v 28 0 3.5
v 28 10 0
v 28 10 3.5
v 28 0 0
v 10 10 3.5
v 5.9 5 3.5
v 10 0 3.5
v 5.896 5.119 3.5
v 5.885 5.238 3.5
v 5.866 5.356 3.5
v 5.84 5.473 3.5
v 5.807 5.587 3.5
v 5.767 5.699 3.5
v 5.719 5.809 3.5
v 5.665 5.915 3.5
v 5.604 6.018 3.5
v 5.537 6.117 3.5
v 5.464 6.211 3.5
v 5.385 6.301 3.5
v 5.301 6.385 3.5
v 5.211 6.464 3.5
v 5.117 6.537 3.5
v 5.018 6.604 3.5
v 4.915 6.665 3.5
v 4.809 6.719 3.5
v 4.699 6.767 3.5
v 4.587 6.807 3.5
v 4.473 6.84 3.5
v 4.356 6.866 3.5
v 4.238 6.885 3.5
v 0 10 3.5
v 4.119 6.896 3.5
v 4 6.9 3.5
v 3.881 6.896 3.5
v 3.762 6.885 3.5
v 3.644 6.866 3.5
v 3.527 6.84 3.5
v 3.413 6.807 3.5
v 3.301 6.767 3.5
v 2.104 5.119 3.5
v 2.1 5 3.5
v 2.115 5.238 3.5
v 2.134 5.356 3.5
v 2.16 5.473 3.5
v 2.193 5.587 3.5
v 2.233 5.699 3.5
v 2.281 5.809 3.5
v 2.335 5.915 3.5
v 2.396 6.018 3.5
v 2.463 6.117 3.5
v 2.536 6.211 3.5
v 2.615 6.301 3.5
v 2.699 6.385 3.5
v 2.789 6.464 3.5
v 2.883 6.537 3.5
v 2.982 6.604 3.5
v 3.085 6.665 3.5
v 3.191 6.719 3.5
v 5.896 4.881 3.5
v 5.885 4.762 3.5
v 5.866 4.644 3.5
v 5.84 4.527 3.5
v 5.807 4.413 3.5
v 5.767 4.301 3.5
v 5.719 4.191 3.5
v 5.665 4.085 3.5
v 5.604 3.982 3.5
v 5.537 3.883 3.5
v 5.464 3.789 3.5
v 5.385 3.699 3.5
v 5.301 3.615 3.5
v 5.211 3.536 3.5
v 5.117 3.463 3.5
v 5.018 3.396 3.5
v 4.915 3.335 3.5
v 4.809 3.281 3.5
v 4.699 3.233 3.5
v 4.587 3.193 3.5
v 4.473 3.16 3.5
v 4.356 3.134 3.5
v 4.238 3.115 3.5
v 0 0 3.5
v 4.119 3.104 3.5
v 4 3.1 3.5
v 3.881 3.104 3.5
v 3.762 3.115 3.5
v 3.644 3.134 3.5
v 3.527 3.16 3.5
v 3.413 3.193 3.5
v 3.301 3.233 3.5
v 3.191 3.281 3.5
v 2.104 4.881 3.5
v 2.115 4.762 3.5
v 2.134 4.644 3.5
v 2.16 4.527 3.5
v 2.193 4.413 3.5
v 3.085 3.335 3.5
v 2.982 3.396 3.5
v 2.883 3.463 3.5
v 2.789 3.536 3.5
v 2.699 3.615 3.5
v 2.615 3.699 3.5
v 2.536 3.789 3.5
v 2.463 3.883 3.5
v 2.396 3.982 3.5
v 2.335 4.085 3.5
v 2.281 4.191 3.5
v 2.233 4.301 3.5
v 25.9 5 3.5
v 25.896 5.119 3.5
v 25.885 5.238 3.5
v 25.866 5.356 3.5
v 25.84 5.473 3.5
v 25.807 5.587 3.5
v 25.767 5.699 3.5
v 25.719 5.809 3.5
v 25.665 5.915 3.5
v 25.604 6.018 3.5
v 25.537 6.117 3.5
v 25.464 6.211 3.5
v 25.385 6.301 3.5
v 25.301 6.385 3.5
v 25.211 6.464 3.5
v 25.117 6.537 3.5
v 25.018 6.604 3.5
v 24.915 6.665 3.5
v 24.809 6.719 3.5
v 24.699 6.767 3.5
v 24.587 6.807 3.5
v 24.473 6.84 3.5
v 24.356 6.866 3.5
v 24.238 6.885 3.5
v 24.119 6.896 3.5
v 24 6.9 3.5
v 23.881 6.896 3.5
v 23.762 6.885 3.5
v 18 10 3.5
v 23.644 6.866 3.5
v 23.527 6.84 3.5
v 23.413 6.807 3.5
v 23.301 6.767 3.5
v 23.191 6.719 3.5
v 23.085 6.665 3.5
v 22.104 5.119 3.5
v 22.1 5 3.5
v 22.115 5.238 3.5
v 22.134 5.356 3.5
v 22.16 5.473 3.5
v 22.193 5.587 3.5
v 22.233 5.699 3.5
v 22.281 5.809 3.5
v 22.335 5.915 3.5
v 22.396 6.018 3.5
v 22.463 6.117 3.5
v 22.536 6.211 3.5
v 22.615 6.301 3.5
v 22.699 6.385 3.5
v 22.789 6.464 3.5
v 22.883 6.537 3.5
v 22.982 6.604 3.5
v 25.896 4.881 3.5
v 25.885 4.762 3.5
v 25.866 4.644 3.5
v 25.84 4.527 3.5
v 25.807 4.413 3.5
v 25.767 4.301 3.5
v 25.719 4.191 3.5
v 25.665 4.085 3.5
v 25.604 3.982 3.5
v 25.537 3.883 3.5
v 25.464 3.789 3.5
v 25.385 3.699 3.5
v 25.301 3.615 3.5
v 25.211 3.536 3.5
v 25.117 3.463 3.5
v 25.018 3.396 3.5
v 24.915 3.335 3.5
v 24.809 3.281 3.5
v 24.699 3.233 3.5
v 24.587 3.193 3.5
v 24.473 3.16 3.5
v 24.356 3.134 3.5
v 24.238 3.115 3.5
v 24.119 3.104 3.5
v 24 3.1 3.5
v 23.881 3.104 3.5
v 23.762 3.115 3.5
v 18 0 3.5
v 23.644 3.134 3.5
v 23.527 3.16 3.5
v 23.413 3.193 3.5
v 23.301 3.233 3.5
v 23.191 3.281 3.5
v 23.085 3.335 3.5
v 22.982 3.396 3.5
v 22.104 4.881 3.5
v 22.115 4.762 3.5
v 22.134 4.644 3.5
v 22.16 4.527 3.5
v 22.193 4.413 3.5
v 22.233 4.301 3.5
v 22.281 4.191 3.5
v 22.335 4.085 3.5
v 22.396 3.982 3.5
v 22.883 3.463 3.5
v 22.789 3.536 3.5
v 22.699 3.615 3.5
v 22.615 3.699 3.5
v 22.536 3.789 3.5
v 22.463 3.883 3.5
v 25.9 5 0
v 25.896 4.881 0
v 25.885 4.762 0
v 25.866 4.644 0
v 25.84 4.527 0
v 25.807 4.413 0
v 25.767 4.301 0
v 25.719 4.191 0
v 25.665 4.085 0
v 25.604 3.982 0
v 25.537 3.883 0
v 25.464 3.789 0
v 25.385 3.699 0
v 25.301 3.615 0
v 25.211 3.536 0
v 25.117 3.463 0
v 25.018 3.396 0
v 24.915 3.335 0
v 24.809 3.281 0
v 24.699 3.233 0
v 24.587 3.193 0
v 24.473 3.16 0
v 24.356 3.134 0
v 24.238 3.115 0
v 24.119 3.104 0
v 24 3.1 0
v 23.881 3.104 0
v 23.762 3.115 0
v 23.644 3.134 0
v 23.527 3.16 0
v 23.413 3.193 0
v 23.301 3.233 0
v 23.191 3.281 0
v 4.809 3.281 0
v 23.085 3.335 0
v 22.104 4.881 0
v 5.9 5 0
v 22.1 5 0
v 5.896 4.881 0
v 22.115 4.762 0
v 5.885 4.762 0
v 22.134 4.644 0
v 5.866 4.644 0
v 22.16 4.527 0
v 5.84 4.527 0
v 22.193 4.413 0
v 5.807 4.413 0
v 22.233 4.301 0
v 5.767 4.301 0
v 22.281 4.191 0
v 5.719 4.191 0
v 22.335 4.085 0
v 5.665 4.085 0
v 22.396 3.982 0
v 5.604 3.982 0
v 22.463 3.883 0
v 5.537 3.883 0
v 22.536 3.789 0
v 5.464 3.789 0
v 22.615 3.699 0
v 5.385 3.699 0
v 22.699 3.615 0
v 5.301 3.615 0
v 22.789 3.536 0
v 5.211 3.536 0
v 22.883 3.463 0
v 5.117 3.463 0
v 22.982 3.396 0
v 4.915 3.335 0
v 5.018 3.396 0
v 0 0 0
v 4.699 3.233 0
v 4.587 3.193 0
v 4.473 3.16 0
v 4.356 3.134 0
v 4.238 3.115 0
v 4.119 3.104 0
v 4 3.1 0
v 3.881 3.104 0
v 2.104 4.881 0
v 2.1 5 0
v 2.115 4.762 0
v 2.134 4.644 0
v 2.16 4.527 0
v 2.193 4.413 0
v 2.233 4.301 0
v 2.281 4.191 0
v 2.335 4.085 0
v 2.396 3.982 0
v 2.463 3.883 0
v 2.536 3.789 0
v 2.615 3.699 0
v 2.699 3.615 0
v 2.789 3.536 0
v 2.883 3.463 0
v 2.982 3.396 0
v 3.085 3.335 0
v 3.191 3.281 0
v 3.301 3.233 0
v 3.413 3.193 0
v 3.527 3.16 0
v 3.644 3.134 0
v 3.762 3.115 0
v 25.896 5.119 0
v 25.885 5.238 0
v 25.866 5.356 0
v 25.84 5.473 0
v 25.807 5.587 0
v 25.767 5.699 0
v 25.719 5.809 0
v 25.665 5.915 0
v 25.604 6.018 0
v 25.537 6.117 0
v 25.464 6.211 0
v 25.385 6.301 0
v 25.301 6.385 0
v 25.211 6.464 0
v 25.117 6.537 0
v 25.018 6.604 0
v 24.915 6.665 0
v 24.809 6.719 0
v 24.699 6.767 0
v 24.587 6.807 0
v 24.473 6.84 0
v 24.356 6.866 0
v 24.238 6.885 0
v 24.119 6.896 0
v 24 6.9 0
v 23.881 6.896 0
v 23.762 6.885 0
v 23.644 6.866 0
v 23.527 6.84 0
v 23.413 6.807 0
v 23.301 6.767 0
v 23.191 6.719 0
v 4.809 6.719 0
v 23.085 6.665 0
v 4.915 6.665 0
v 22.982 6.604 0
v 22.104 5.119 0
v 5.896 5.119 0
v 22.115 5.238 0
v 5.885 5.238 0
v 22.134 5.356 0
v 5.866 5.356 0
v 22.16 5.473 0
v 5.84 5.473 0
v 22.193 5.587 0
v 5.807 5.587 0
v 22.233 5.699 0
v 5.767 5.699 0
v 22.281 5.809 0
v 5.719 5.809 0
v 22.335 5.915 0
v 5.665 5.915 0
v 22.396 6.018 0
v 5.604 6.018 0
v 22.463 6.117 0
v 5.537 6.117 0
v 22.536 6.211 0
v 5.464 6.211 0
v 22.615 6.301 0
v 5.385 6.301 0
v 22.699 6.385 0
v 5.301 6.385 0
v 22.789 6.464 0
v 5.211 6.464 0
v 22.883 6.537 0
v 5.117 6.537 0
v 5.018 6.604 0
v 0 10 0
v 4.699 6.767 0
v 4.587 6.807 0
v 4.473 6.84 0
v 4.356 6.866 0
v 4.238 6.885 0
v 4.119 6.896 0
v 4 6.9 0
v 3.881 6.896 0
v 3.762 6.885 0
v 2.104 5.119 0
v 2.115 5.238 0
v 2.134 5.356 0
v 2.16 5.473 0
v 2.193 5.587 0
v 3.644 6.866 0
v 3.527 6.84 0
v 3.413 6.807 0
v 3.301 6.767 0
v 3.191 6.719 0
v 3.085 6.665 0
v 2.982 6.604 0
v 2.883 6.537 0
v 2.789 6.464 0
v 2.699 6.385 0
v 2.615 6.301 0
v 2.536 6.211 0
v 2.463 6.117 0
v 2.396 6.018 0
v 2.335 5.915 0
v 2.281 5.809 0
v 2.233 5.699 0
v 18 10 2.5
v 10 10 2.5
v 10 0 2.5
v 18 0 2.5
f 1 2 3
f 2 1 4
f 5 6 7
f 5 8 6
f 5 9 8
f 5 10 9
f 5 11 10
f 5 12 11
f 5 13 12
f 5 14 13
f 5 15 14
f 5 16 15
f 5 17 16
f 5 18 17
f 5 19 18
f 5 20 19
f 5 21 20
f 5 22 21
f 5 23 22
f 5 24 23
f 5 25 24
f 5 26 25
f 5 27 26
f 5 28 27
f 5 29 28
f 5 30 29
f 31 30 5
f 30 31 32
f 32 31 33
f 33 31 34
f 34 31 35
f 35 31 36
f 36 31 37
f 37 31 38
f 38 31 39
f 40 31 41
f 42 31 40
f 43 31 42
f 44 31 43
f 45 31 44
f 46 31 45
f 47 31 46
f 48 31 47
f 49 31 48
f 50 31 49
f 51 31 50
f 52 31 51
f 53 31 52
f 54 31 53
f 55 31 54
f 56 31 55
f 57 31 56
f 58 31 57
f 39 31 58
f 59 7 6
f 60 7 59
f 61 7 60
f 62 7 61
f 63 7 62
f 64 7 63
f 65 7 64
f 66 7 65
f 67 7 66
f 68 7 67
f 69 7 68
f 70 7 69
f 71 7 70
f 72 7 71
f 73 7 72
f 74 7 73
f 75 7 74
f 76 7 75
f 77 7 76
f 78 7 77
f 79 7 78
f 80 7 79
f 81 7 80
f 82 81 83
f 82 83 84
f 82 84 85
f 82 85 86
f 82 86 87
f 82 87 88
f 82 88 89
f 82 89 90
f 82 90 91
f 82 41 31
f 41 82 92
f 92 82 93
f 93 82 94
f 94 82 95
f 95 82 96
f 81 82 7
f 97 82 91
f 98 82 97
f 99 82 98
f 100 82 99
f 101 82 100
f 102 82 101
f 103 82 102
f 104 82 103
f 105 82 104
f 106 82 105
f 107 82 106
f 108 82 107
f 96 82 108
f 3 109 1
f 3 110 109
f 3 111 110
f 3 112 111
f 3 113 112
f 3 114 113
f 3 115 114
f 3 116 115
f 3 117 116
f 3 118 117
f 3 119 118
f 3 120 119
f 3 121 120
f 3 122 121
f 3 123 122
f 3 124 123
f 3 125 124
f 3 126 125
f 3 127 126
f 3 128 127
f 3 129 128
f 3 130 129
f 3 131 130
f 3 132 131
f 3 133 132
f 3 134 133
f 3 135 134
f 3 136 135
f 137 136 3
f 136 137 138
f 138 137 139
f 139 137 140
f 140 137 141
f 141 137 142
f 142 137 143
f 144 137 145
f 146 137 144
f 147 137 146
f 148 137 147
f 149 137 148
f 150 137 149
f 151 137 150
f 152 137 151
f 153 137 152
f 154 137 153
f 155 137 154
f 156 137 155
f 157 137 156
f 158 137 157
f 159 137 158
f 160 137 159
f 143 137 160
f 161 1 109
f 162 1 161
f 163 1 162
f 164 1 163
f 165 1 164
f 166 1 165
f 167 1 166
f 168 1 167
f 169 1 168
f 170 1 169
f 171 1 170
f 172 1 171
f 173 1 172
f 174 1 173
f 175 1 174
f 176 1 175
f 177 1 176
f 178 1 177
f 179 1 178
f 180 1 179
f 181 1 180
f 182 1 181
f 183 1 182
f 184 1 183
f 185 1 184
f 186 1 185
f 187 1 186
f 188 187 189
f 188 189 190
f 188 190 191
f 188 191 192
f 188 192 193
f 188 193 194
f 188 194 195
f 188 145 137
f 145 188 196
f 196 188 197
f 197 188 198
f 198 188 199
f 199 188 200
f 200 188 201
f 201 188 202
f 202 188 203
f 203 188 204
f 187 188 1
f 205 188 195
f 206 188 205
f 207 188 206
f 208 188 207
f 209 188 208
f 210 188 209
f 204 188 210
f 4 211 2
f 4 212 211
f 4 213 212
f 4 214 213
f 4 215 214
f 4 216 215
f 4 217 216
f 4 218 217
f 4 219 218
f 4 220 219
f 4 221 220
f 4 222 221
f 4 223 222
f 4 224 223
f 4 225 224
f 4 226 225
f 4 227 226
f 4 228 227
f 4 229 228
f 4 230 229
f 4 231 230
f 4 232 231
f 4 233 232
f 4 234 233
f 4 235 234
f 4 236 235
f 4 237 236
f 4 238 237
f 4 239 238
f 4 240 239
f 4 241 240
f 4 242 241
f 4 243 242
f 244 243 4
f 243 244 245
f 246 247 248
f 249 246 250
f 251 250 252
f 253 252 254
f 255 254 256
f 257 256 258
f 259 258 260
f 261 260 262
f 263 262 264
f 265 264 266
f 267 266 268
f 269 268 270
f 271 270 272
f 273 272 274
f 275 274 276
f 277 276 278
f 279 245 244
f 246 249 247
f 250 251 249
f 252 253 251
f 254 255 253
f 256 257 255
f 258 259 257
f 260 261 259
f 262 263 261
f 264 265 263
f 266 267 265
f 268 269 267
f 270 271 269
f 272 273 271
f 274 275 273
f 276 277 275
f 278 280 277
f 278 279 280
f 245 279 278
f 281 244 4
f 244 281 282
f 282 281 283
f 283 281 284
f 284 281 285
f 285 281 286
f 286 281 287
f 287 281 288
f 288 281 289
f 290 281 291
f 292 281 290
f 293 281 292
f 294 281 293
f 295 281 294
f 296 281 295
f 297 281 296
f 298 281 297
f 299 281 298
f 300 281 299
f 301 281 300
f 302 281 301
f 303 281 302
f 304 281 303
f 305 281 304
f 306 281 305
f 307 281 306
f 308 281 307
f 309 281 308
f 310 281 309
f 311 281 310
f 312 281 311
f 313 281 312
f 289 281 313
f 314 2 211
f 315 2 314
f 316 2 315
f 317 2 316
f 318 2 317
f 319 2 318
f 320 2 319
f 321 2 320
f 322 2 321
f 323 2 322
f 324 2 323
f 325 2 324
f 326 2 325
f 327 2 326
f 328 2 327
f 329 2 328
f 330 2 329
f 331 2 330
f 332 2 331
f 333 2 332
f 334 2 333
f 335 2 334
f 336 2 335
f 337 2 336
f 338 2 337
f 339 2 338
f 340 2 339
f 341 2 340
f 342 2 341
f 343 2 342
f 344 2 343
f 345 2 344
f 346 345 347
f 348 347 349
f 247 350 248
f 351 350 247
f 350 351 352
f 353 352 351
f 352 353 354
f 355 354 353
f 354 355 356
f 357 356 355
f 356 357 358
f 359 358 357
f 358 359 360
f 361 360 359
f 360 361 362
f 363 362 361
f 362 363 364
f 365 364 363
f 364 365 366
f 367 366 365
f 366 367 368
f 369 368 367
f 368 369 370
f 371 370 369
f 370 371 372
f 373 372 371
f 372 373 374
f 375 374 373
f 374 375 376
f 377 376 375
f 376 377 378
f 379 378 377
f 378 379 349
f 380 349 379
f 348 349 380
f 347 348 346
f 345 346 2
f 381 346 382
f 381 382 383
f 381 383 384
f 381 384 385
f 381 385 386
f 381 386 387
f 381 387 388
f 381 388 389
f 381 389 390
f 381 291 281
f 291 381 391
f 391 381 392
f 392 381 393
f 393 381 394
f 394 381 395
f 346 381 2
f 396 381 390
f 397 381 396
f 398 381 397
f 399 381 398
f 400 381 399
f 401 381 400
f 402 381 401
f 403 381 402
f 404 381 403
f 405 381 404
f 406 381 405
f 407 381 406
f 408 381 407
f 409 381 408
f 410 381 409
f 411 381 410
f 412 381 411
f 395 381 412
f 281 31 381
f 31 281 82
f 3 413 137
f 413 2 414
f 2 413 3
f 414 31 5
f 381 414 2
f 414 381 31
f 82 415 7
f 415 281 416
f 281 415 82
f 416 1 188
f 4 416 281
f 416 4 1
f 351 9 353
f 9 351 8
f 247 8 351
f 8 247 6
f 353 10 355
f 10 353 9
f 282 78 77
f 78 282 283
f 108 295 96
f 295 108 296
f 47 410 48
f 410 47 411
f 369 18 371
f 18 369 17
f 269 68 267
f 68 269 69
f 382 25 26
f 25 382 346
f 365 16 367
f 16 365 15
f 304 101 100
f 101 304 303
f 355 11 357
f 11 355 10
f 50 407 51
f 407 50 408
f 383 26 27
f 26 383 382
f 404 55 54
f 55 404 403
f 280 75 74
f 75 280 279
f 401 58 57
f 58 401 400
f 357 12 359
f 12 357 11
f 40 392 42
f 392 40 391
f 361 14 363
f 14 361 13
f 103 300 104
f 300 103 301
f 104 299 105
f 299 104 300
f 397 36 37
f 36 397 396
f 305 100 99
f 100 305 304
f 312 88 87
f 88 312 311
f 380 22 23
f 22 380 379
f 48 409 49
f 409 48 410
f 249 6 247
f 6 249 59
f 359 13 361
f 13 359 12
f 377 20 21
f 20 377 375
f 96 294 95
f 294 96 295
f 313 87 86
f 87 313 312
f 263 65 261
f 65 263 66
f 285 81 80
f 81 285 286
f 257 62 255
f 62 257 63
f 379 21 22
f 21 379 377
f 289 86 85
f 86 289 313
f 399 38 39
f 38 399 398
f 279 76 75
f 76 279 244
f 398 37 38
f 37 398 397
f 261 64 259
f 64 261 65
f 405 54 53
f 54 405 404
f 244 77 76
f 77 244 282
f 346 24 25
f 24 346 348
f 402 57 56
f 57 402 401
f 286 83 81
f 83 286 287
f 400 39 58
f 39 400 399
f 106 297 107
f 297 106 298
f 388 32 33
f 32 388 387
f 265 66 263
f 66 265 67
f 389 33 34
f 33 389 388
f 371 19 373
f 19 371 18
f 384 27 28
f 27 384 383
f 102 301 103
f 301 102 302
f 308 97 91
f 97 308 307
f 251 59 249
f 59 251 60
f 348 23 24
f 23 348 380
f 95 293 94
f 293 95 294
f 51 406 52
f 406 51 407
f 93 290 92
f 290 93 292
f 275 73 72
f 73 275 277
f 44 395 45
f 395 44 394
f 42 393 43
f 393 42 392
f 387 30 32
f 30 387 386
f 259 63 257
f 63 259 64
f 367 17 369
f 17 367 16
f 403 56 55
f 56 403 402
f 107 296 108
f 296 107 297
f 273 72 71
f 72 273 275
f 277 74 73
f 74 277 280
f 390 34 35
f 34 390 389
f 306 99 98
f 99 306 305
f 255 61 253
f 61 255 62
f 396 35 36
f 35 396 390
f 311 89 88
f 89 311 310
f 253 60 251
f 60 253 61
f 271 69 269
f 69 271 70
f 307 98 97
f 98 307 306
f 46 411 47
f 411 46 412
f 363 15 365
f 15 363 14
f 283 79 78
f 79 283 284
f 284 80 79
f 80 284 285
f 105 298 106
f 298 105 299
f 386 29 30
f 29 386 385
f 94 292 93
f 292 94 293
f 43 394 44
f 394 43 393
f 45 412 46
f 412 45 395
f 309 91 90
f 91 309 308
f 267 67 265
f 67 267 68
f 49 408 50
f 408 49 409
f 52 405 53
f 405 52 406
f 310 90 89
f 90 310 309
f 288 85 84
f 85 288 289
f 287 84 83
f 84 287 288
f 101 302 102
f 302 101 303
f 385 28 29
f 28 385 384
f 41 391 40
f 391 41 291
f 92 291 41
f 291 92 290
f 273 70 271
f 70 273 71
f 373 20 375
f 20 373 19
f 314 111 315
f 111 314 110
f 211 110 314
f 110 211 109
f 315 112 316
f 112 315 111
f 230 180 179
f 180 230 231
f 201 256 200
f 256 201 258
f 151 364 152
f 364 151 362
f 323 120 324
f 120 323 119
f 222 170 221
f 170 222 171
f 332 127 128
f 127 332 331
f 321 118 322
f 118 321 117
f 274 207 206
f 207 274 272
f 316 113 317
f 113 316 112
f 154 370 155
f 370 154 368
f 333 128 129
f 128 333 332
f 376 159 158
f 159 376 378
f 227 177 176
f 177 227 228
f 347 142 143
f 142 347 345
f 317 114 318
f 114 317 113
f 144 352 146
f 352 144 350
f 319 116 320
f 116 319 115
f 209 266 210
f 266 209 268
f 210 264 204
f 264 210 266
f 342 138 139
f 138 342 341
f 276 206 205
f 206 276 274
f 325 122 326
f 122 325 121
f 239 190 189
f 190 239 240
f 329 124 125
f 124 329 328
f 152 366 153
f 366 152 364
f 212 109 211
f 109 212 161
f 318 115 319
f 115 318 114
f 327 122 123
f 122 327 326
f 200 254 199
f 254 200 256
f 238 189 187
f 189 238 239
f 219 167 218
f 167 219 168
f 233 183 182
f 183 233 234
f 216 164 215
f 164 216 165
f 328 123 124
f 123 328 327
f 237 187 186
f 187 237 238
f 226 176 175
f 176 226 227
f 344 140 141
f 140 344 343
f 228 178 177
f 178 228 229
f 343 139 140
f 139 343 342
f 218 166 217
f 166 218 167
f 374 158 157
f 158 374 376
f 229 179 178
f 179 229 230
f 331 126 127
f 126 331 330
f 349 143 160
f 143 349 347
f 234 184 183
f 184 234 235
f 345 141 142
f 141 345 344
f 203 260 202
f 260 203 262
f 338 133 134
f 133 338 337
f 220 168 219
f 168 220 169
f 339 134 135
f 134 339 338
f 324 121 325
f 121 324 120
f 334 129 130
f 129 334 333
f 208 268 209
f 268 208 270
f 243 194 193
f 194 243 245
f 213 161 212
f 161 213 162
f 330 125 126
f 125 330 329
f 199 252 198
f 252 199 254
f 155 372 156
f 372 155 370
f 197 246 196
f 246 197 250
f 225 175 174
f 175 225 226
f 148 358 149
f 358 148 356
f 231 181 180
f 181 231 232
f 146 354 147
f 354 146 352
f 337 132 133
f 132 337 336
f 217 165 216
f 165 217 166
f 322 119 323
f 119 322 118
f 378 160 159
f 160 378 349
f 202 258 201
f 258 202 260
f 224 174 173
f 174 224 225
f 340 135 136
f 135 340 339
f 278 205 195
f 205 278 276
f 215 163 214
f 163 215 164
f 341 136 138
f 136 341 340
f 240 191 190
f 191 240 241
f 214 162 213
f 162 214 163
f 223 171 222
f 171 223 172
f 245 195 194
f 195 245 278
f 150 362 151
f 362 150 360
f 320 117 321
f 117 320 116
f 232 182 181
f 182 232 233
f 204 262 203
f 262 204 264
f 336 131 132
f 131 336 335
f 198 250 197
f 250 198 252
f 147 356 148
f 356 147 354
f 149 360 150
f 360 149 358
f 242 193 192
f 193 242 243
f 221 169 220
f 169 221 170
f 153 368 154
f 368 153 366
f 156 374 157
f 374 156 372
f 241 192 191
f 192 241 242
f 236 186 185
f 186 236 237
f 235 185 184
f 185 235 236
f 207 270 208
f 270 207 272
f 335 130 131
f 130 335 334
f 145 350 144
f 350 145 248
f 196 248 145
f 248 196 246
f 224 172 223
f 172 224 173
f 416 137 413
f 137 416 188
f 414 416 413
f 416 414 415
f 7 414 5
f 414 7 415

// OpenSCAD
// file: functions.scad
/**********************************
	File: functions.scad
	Revision: 0.1 (10/7/2012)
	OpenSCAD version by:
	Michael Williams (gannon)
	mswillia@mtu.edu
**********************************/
include <config.scad>

//Drill a hole the given depth at the given location
module drill(x,y,radius,depth) {
	translate([x,y,-overdrill])
		cylinder(r=radius,h=depth,$fn=100);
}

module roundedcorner(radius,thickness,angle) {
	rotate([0,0,angle])
		translate([-radius+overdrill,-radius+overdrill,-overdrill])
			difference() {
				translate([-overdrill,-overdrill,0])
					cube([radius+overdrill,radius+overdrill,thickness+overdrill*2]);
				cylinder(r=radius,h=thickness+overdrill*2);
			}
}

//Usage: points is an array consisting of elements
//[x,y,r] for each point of the polygon
//Please note that x and y will be the centers
//of the rounded edges! Outside wall will be
//r away at some angle.
//Ideally I will make a function that will find
//the place to put the circle of a given radius
//based off of the points in the polygon.
module multiradiusroundedpoly(points,height) {
	linear_extrude(height=height)
		hull()
			for (p = points) {
				translate([p[0],p[1],0])
					circle(r=p[2],$fn=100);
			}
}
// file: config.scad
/**********************************
	File: config.scad
	Revision: 0.1 (10/7/2012)
	OpenSCAD version by:
	Michael Williams (gannon)
	mswillia@mtu.edu
**********************************/

/**********************************
		CONFIGURATION
**********************************/
//This is for the depth of holes so OpenSCAD renders correctly.
overdrill=0.1;

//Eventually group configurations into here. Maybe auto config for metric vs SAE components?

/**********************************
		END CONFIGURATION
**********************************/
// main file
/**********************************
	File: beltclamp.scad
	Revision: 0.2 (10/7/2012)
	OpenSCAD version by:
	Michael Williams (gannon)
	mswillia@mtu.edu
**********************************/
include <config.scad>
use <functions.scad>
/**********************************
		CONFIGURATION
**********************************/
//Base size
thickness=3.5;
width=28;
height=10;

//Hole configuration
hole_spacing=20;
hole_radius=1.9;

//Belt configuration
belt_width=8;
belt_depth=1;

/**********************************
		END CONFIGURATION
**********************************/

difference() {

	//Make our base unit
	cube([width,height,thickness]);

	//Drill the holes
	drill(((width-hole_spacing)/2),(height/2),hole_radius,thickness+overdrill*2);
	drill(width-((width-hole_spacing)/2),(height/2),hole_radius,thickness+overdrill*2);

	//Make the belt cutout
	translate([((width-belt_width)/2),-overdrill,thickness-belt_depth])
		cube([belt_width,height+overdrill*2,belt_depth+overdrill]);

}
